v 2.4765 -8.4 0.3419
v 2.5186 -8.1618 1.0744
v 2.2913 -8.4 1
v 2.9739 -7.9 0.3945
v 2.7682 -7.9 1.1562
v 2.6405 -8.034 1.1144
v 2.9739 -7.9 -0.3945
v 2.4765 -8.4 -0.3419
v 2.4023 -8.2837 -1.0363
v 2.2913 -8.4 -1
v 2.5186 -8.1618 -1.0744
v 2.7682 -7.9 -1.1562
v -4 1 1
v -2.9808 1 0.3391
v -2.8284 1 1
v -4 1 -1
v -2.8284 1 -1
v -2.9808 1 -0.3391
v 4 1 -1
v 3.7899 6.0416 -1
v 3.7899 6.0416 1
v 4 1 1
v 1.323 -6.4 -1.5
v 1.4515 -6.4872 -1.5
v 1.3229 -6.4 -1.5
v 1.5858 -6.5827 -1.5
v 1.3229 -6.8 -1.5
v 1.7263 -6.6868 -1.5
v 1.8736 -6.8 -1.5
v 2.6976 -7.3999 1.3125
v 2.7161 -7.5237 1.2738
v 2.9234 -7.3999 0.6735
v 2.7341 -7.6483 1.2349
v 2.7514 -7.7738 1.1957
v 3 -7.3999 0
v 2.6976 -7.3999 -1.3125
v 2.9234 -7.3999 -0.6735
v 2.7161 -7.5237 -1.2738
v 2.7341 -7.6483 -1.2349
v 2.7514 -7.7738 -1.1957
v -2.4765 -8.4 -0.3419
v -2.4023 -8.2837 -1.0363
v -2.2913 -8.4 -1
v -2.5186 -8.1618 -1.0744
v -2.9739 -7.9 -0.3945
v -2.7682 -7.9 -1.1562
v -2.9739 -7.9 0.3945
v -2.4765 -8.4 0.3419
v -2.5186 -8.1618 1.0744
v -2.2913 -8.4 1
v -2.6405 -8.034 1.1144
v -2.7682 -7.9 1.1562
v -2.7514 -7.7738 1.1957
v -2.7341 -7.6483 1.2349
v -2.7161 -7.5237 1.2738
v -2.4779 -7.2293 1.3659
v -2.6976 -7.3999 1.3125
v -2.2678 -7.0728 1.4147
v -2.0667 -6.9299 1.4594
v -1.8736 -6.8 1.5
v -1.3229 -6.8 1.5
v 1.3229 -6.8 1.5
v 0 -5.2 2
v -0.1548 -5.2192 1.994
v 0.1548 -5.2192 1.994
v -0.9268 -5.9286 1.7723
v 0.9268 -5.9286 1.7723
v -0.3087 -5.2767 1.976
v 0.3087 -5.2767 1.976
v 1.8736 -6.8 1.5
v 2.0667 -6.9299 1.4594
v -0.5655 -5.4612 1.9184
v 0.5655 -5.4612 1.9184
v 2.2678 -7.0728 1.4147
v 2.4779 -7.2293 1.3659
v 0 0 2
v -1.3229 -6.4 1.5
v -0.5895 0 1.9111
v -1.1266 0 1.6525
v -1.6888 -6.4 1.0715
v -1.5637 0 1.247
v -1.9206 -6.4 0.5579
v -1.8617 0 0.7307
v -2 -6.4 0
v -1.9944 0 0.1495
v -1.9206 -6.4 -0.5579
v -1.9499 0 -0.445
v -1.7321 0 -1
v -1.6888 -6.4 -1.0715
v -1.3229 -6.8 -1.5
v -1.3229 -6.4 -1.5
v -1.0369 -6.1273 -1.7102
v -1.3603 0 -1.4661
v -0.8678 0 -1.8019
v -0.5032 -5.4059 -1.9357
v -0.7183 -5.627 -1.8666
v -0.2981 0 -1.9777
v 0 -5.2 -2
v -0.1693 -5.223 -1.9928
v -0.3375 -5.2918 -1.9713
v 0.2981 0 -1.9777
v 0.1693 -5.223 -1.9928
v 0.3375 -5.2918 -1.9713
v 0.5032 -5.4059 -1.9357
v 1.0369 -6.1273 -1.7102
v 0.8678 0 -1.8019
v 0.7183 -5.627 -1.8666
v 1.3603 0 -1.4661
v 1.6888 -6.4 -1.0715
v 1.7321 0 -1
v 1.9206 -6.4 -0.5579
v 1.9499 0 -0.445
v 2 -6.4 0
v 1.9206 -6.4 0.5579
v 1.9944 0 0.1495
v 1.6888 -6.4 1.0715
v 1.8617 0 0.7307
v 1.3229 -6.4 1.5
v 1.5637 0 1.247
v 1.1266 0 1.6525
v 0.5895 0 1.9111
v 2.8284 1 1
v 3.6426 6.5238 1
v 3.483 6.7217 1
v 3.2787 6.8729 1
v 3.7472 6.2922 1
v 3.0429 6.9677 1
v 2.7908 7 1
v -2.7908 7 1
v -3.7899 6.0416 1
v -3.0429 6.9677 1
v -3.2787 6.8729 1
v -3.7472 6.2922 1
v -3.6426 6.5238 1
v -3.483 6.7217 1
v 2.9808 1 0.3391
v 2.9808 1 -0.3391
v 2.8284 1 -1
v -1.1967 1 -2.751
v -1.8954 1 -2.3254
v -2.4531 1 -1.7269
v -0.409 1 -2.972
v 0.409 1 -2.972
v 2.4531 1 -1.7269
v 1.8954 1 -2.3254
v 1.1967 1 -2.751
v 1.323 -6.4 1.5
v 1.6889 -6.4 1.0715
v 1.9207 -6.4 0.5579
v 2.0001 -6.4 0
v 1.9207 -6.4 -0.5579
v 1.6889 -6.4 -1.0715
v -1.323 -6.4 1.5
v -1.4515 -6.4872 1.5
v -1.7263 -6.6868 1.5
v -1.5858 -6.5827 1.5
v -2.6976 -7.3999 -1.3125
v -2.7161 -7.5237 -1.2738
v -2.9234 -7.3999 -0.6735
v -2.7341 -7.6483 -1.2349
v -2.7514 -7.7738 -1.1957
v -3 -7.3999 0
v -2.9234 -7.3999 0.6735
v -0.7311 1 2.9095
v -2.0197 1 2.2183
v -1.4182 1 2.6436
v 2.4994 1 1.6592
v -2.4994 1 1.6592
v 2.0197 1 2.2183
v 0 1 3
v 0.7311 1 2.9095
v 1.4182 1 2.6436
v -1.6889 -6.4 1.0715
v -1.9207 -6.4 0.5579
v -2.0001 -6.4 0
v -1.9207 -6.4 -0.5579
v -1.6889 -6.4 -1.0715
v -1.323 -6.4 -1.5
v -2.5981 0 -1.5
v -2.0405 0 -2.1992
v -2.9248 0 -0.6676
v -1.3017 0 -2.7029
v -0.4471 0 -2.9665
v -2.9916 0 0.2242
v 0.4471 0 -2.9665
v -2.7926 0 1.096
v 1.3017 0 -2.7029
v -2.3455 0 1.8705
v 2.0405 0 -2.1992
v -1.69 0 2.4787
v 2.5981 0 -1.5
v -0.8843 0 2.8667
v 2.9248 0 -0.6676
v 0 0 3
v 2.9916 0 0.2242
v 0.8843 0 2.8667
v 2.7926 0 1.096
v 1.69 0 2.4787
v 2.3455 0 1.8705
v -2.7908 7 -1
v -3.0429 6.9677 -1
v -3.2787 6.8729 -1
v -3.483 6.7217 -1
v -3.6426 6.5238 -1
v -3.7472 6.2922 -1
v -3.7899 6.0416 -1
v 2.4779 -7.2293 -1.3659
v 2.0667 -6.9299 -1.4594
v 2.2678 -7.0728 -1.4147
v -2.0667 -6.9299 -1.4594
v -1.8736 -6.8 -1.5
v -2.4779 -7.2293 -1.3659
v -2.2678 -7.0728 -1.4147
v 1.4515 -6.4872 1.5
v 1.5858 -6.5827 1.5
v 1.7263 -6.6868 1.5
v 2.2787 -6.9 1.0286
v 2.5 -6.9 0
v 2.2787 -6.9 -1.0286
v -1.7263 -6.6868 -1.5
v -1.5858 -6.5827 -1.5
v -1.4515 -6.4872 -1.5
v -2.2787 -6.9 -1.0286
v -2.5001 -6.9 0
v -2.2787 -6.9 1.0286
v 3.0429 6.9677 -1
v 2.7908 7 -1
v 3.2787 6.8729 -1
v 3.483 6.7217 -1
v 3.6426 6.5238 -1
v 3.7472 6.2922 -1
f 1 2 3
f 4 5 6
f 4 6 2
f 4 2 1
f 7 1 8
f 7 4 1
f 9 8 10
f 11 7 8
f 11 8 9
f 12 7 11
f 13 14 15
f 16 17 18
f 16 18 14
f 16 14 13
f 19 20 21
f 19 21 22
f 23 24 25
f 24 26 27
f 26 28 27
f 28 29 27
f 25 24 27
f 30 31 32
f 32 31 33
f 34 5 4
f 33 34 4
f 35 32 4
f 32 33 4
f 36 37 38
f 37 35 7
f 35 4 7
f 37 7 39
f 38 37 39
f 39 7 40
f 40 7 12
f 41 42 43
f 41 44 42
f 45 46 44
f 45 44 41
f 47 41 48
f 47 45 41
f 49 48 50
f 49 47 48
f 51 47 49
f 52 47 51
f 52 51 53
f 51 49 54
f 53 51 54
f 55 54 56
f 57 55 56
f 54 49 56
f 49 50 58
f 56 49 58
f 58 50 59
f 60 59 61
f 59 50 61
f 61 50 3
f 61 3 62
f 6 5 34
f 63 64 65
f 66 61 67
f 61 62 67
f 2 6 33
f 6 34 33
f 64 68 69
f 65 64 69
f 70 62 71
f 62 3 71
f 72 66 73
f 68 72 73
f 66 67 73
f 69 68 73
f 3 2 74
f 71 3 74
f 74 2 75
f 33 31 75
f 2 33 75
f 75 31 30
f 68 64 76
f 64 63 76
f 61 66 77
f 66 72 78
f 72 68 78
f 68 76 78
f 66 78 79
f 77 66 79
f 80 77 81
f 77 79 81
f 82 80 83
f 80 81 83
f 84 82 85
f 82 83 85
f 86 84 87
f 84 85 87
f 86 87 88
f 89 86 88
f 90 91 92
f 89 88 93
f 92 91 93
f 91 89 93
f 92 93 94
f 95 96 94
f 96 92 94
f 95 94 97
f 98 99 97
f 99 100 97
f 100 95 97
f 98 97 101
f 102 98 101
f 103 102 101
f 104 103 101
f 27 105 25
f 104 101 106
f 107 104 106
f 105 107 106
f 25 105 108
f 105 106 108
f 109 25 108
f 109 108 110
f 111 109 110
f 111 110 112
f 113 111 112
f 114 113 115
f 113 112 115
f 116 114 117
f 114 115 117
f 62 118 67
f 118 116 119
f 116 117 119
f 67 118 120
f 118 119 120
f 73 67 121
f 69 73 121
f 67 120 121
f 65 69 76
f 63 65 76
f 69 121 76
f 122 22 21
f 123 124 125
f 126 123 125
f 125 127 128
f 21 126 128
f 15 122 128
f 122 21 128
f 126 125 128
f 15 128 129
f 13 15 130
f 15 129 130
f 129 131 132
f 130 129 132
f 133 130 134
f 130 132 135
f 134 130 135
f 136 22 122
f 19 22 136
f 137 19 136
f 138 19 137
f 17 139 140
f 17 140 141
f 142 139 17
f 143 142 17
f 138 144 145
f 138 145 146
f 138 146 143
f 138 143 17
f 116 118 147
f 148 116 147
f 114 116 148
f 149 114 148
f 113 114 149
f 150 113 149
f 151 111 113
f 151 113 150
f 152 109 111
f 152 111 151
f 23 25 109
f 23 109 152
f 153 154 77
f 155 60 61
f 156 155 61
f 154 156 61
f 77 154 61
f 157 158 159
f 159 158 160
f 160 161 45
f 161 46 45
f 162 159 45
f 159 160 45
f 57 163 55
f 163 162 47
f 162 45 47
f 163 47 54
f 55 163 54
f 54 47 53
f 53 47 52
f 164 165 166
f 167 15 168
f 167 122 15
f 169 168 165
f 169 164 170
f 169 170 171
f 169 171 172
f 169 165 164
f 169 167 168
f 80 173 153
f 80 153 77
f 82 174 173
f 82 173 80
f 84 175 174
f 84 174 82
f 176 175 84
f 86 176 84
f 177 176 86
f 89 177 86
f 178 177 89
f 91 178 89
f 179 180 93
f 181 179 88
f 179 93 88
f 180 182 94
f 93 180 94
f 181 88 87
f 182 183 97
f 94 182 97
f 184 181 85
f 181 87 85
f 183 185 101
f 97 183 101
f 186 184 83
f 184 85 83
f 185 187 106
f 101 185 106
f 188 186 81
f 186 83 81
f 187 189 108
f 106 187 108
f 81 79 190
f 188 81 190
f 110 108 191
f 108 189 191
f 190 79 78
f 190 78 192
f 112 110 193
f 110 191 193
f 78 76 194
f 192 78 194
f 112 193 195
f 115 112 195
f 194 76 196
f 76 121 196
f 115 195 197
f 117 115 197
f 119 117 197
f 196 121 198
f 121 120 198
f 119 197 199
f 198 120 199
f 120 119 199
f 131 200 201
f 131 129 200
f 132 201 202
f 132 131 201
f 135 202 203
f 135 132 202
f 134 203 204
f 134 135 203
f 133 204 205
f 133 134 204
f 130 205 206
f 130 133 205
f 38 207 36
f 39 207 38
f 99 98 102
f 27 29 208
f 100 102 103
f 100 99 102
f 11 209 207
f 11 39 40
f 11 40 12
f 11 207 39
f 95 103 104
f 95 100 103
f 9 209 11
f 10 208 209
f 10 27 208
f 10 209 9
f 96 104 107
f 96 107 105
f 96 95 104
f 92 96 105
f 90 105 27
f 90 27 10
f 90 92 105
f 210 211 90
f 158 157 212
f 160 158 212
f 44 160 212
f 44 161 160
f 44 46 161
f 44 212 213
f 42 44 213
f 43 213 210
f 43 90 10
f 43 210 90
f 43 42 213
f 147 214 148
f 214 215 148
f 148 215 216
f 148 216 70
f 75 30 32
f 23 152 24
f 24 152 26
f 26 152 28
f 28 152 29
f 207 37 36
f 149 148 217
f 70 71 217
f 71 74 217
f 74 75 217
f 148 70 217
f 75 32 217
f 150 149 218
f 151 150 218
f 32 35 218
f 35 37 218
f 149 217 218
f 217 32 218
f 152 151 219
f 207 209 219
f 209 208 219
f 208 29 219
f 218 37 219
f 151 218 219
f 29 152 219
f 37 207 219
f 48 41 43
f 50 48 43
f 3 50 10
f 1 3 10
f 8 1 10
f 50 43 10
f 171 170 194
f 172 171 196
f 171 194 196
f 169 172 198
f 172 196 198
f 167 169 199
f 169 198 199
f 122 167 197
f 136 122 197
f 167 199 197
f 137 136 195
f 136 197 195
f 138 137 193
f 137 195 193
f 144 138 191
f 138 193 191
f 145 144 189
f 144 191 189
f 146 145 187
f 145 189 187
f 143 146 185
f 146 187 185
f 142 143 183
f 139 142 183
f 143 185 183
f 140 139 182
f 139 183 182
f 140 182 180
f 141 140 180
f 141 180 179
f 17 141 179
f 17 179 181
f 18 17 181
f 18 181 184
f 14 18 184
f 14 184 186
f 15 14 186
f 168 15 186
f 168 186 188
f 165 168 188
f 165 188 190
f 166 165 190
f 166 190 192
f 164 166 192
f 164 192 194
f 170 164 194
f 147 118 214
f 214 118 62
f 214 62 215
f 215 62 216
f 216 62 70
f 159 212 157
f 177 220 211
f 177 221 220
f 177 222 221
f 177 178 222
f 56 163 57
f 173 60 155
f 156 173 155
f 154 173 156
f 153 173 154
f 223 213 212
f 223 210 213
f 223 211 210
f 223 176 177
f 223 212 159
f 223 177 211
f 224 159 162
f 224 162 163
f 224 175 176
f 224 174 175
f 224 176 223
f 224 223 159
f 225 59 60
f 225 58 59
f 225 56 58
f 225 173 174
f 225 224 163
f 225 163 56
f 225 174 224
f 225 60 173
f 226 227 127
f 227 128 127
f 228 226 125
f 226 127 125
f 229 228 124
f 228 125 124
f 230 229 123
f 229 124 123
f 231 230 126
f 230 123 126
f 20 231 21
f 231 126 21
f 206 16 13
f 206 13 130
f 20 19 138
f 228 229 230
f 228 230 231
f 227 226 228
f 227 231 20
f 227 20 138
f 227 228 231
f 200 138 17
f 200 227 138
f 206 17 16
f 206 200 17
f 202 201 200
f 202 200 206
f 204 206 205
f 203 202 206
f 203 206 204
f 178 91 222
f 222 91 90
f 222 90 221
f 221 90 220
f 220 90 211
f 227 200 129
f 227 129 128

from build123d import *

# Parameters (mm, degrees)
SKETCH_1_R                      = 3
EXTRUDE_1_DEPTH                 = 1
EXTRUDE_2_DEPTH                 = 1
EXTRUDE_2_DEPTH_BACK            = 1
FILLET_1_R                      = 1
SKETCH_3_R                      = 2
EXTRUDE_3_DEPTH                 = 8.4
EXTRUDE_4_DEPTH                 = 2
CHAMFER_1_SIZE                  = 0.5
CHAMFER_2_SIZE                  = 1
CUT_EXTRUDE_1_REACH             = 11.775
CUT_EXTRUDE_1_DIRECTION_2_REACH = 11.775


with BuildPart() as part:
    # 草图1 → 凸台-拉伸1 (new body)
    with BuildSketch(Plane(origin=(0, 0, 0), x_dir=(1, 0, 0), z_dir=(0, 1, 0))):
        with Locations(Location((0, 0, 0), (0, 0, 270))):
            Circle(SKETCH_1_R)
    extrude(amount=EXTRUDE_1_DEPTH)

    # 草图2 → 凸台-拉伸2 (add, two sides: drawn at the far end of the back side and taken through both)
    with BuildSketch(Plane.XY.offset(-EXTRUDE_2_DEPTH_BACK)):
        Polygon((-3.75, 7), (3.75, 7), (4, 1), (-4, 1), align=None)
    extrude(amount=EXTRUDE_2_DEPTH + EXTRUDE_2_DEPTH_BACK)

    # 圆角1
    fillet_1_edges = [part.edges().sort_by_distance(p)[0] for p in [
        (-3.75, 7, 0),
        (3.75, 7, 0),
    ]]
    fillet(fillet_1_edges, radius=FILLET_1_R)

    # 草图3 → 凸台-拉伸3 (add)
    with BuildSketch(Plane(origin=(0, 0, 0), x_dir=(-1, 0, 0), z_dir=(0, -1, 0))):
        with Locations(Location((0, 0, 0), (0, 0, 270))):
            Circle(SKETCH_3_R)
    extrude(amount=EXTRUDE_3_DEPTH)

    # 草图4 → 凸台-拉伸4 (add)
    with BuildSketch(Plane(origin=(0, -8.4, 0), x_dir=(-1, 0, 0), z_dir=(0, -1, 0))):
        with BuildLine():
            Line((2.598076211, -1.5), (-2.598076211, -1.5))
            ThreePointArc((-2.598076211, -1.5), (-3, 0), (-2.598076211, 1.5))
            Line((-2.598076211, 1.5), (2.598076211, 1.5))
            ThreePointArc((2.598076211, 1.5), (3, 0), (2.598076211, -1.5))
        make_face()
    extrude(amount=-EXTRUDE_4_DEPTH)

    # 倒角1
    chamfer_1_edges = [part.edges().sort_by_distance(p)[0] for p in [
        (3, -8.4, 0),
        (-3, -8.4, 0),
    ]]
    chamfer(chamfer_1_edges, length=CHAMFER_1_SIZE)

    # 倒角2
    chamfer_2_edges = [part.edges().sort_by_distance(p)[0] for p in [
        (3, -6.4, 0),
        (-3, -6.4, 0),
    ]]
    chamfer(chamfer_2_edges, length=CHAMFER_2_SIZE - 0.0001)  # a hair under: the kernel refuses the full size

    # 草图5 → 切除-拉伸1 (cut, up to next)
    with BuildSketch(Plane(origin=(0, 0, 0), x_dir=(0, 0, -1), z_dir=(1, 0, 0)), mode=Mode.PRIVATE) as cut_extrude_1_sk1:
        Polygon((2, -5.2), (1, -8.4), (2, -8.4), align=None)
    cut_extrude_1_tool1 = extrude(cut_extrude_1_sk1.sketch, amount=-CUT_EXTRUDE_1_REACH, mode=Mode.PRIVATE) & part.part
    # 草图5 → 切除-拉伸1 (cut, up to next)
    with BuildSketch(Plane(origin=(0, 0, 0), x_dir=(0, 0, -1), z_dir=(1, 0, 0)), mode=Mode.PRIVATE) as cut_extrude_1_sk2:
        Polygon((-2, -5.2), (-2, -8.4), (-1, -8.4), align=None)
    cut_extrude_1_tool2 = extrude(cut_extrude_1_sk2.sketch, amount=-CUT_EXTRUDE_1_REACH, mode=Mode.PRIVATE) & part.part
    add(cut_extrude_1_tool1.solids().sort_by_distance((0, -7.333333, -1.666667))[0], mode=Mode.SUBTRACT)
    add(cut_extrude_1_tool2.solids().sort_by_distance((0, -7.333333, 1.666667))[0], mode=Mode.SUBTRACT)

    # 草图5 → 切除-拉伸1 direction 2 (cut, up to next)
    with BuildSketch(Plane(origin=(0, 0, 0), x_dir=(0, 0, -1), z_dir=(1, 0, 0)), mode=Mode.PRIVATE) as cut_extrude_1_direction_2_sk1:
        Polygon((2, -5.2), (1, -8.4), (2, -8.4), align=None)
    cut_extrude_1_direction_2_tool1 = extrude(cut_extrude_1_direction_2_sk1.sketch, amount=CUT_EXTRUDE_1_DIRECTION_2_REACH, mode=Mode.PRIVATE) & part.part
    # 草图5 → 切除-拉伸1 direction 2 (cut, up to next)
    with BuildSketch(Plane(origin=(0, 0, 0), x_dir=(0, 0, -1), z_dir=(1, 0, 0)), mode=Mode.PRIVATE) as cut_extrude_1_direction_2_sk2:
        Polygon((-2, -5.2), (-2, -8.4), (-1, -8.4), align=None)
    cut_extrude_1_direction_2_tool2 = extrude(cut_extrude_1_direction_2_sk2.sketch, amount=CUT_EXTRUDE_1_DIRECTION_2_REACH, mode=Mode.PRIVATE) & part.part
    add(cut_extrude_1_direction_2_tool1.solids().sort_by_distance((0, -7.333333, -1.666667))[0], mode=Mode.SUBTRACT)
    add(cut_extrude_1_direction_2_tool2.solids().sort_by_distance((0, -7.333333, 1.666667))[0], mode=Mode.SUBTRACT)


solid = part.part
